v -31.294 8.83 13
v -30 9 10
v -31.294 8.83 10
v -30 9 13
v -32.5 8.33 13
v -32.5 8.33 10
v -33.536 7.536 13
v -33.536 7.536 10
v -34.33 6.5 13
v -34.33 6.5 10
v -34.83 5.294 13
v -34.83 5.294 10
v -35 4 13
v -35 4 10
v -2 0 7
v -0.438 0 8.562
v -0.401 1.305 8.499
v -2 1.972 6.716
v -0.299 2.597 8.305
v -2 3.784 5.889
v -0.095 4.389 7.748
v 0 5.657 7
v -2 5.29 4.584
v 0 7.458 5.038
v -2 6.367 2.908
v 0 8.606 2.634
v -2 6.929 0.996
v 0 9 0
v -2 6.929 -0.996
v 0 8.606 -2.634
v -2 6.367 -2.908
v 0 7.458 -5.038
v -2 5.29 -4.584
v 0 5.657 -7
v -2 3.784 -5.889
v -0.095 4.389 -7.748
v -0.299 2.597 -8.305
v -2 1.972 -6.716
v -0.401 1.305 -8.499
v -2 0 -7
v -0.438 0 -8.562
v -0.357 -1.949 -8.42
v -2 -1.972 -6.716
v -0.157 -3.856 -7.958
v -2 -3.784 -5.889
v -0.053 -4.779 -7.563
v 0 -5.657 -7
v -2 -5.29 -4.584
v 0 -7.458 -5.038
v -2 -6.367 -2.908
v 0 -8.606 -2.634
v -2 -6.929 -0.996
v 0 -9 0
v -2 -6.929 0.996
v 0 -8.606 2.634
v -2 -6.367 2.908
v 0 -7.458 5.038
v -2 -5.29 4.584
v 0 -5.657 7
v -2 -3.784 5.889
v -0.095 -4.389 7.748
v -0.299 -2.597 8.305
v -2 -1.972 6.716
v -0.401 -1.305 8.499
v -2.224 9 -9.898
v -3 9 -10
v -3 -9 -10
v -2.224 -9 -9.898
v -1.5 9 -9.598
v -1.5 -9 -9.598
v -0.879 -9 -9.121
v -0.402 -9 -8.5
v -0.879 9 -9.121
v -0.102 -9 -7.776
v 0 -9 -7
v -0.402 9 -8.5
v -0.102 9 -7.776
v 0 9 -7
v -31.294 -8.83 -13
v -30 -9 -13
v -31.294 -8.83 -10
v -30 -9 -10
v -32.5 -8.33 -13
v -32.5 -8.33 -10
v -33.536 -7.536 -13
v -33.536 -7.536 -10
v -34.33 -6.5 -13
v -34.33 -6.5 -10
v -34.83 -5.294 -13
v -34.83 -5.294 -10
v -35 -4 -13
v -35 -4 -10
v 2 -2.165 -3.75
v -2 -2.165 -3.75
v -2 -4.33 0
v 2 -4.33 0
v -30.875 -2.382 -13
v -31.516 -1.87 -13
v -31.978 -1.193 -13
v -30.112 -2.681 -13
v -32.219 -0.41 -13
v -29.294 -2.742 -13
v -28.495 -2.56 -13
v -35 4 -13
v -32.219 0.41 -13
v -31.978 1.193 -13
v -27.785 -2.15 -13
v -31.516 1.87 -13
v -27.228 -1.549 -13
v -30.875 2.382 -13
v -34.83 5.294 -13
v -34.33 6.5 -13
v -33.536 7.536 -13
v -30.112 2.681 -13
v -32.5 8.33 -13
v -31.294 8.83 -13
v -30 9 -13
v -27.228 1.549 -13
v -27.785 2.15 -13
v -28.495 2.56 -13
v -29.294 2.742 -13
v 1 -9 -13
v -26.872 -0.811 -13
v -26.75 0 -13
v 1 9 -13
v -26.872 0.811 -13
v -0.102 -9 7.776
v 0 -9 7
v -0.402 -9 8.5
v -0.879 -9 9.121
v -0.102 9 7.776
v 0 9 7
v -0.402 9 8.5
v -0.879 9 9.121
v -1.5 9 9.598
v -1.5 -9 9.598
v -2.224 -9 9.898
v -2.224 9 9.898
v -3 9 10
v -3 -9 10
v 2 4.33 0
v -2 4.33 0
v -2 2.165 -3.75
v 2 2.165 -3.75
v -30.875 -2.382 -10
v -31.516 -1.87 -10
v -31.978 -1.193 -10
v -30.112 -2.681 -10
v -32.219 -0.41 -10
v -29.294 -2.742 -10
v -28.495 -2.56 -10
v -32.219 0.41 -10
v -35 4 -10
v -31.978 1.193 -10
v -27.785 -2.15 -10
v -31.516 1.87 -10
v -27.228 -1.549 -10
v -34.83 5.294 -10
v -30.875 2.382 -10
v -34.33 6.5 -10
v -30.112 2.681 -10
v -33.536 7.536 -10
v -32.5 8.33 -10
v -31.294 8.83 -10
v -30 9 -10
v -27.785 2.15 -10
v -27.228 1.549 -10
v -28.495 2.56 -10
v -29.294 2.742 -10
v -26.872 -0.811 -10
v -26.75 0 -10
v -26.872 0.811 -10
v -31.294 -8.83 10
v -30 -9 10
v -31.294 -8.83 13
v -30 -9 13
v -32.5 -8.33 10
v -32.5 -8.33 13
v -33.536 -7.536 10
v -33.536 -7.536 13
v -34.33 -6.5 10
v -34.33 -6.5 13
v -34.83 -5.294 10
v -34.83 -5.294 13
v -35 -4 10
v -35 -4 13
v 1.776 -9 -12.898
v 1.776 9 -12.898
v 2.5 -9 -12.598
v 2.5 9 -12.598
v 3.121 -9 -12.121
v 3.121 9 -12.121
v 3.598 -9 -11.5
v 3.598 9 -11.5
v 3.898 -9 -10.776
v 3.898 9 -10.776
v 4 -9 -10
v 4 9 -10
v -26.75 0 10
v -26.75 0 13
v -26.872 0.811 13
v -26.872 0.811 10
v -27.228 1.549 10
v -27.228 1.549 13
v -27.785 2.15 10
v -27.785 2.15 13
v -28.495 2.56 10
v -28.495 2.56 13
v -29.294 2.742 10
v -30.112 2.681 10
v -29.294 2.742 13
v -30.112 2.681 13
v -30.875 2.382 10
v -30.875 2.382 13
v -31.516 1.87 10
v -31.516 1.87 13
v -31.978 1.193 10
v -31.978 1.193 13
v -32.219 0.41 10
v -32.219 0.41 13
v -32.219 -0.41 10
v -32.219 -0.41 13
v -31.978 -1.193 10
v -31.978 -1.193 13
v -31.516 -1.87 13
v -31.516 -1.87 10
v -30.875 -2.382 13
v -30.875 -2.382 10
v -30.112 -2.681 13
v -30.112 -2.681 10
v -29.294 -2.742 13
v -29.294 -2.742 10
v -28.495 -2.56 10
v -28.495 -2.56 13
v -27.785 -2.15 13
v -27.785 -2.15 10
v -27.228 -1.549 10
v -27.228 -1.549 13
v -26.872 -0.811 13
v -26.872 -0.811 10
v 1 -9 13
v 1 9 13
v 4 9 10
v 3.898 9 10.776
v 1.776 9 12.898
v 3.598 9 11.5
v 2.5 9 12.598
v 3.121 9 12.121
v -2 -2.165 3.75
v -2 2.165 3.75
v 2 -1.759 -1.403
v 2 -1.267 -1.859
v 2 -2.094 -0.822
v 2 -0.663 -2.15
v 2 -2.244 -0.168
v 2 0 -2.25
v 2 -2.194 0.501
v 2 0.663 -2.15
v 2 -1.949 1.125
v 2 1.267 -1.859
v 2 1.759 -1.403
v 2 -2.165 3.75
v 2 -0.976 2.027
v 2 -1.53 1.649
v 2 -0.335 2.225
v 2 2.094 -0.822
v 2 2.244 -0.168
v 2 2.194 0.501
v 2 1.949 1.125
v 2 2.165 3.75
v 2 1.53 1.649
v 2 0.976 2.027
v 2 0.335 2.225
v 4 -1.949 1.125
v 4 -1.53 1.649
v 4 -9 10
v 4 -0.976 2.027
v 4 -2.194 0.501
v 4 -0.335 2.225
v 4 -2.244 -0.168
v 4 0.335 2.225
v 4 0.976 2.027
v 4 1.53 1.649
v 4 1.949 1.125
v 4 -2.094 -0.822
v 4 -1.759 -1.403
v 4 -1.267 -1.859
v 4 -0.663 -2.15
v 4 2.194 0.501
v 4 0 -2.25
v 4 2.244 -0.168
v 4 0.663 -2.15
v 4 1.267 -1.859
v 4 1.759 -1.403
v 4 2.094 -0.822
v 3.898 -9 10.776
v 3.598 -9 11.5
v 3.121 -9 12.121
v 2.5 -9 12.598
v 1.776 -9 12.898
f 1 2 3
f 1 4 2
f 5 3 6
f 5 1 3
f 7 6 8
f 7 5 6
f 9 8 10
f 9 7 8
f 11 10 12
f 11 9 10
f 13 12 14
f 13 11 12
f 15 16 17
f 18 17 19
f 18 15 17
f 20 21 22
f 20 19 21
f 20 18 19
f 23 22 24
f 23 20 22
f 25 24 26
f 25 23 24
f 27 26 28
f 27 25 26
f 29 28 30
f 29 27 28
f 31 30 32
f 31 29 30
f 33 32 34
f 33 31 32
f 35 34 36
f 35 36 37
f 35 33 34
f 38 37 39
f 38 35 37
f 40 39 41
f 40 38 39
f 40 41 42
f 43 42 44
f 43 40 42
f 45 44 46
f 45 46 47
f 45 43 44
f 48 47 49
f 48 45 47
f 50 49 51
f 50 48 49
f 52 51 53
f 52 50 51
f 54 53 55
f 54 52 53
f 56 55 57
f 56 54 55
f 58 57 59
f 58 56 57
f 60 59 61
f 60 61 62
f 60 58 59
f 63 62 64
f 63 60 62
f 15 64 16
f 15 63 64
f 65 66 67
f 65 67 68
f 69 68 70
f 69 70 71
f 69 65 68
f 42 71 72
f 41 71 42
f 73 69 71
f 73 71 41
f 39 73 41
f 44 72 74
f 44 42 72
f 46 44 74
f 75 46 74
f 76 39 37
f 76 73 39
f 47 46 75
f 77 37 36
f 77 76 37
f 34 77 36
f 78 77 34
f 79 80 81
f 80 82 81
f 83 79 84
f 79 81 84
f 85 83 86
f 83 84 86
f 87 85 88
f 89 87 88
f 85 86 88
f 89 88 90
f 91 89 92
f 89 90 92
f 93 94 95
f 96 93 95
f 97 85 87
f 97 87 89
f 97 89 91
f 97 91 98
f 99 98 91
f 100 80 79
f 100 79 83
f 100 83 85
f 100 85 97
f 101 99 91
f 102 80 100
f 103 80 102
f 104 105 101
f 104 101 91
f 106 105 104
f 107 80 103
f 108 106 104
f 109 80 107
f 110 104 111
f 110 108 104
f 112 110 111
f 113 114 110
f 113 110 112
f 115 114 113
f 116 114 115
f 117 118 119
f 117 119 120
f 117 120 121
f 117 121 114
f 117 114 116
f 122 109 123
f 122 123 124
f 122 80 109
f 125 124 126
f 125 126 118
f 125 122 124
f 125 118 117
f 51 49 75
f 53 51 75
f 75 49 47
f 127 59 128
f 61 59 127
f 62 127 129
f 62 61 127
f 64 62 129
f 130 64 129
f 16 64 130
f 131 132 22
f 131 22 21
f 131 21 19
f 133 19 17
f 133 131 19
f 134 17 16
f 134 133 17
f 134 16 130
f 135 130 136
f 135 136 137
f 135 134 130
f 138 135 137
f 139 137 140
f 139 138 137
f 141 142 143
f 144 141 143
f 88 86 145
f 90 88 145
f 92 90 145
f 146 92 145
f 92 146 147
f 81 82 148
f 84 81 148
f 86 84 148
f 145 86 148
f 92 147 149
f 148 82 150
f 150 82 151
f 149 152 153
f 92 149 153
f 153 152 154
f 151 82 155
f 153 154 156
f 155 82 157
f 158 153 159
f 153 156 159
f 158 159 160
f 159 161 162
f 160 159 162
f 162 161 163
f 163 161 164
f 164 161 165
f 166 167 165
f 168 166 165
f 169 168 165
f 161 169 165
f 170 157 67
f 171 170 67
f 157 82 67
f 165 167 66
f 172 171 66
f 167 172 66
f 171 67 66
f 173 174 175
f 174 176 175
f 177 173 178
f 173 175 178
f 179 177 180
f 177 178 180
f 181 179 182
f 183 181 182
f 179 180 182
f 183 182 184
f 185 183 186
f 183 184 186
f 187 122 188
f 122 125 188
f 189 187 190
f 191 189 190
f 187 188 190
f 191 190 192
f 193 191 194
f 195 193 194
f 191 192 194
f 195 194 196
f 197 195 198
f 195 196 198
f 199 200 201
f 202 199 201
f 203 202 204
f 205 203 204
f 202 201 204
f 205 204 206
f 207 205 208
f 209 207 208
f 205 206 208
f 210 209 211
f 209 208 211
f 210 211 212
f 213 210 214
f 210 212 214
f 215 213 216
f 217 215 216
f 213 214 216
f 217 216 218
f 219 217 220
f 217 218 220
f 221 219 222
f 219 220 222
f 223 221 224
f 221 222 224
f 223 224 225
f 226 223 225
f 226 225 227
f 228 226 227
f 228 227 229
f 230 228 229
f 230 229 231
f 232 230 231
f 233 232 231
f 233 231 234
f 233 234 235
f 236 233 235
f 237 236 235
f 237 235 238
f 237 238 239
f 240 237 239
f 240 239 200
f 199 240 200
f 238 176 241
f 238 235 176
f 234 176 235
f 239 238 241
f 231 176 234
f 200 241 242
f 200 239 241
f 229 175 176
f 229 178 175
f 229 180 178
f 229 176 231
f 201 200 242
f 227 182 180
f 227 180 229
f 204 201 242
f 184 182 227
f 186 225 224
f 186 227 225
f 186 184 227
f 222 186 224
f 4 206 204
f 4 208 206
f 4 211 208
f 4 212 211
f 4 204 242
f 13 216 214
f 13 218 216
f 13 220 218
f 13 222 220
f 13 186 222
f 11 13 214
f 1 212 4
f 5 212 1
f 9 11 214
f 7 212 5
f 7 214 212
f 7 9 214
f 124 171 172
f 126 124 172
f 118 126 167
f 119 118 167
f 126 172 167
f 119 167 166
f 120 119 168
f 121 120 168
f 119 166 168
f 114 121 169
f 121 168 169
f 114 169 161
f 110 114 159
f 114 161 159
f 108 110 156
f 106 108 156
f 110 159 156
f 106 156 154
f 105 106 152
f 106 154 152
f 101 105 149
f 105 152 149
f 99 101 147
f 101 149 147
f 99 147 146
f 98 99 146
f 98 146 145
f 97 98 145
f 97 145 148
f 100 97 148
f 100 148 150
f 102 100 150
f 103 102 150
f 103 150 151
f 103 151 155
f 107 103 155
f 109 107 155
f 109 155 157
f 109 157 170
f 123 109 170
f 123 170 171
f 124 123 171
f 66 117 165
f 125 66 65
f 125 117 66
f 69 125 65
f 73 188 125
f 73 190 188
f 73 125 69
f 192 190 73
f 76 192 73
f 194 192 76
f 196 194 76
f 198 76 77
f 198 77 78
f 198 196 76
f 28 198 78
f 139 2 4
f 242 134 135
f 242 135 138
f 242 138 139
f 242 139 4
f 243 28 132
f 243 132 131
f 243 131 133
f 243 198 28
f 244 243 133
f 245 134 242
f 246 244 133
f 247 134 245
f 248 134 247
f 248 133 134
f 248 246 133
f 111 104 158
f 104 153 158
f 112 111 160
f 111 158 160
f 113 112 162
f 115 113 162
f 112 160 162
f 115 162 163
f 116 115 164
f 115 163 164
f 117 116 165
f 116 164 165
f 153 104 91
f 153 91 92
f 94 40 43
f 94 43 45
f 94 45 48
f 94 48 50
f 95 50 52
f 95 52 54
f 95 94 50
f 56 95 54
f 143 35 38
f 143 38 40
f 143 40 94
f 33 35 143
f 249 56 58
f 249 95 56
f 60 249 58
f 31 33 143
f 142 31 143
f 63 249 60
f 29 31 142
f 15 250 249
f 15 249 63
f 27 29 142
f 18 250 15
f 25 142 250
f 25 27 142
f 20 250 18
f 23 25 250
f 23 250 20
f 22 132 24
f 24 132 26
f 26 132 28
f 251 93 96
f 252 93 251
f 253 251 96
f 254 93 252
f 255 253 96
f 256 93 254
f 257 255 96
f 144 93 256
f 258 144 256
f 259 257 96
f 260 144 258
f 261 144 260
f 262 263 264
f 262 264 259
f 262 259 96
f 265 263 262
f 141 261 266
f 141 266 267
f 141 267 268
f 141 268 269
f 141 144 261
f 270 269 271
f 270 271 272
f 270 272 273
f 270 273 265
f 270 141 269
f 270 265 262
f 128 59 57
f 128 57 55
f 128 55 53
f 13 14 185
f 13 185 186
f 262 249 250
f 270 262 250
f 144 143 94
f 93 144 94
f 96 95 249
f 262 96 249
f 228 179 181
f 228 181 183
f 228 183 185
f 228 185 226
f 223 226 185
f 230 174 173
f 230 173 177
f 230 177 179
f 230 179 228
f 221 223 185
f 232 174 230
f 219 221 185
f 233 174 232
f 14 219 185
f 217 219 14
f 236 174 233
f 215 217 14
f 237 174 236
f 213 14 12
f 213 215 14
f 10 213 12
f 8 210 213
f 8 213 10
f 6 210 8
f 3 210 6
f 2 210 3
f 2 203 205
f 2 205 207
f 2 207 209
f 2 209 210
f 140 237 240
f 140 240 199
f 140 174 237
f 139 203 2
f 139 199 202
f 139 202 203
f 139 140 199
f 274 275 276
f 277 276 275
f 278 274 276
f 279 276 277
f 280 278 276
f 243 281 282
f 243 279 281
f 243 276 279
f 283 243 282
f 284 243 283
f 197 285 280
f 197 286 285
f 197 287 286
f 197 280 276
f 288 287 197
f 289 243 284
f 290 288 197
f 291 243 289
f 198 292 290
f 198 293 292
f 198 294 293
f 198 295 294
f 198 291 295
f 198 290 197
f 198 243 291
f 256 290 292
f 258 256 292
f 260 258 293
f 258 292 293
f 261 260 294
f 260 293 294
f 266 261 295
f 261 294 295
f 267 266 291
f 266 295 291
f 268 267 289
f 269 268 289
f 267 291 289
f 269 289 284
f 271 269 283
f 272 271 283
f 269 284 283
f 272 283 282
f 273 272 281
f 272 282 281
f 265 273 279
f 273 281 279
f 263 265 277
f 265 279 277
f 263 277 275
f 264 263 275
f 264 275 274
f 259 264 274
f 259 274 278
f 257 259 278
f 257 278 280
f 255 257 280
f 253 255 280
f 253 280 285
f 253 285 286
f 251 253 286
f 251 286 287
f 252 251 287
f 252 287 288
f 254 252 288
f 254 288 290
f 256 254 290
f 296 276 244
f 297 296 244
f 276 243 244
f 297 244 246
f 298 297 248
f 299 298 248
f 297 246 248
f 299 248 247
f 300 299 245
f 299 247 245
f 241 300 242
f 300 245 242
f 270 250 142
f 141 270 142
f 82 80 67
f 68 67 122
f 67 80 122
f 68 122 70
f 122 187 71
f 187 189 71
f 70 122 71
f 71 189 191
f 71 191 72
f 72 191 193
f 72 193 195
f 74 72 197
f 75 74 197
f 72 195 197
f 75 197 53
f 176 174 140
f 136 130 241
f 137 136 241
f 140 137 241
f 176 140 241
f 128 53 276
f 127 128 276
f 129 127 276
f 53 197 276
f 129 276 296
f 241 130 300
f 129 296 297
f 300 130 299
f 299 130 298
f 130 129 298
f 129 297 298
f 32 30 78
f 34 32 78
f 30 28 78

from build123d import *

# Parameters (mm, degrees)
SKETCH1_W           = 26
SKETCH1_H           = 18
BOSS_EXTRUDE1_DEPTH = 4
SKETCH2_W           = 3
SKETCH2_H           = 18
BOSS_EXTRUDE2_DEPTH = 35
SKETCH3_R           = 2.75
CUT_EXTRUDE1_DEPTH  = 45.519658579
FILLET1_R           = 3
FILLET2_R           = 5
SKETCH5_R           = 7
BOSS_EXTRUDE3_DEPTH = 2
CUT_EXTRUDE3_REACH  = 44.083
SKETCH7_R           = 2.25
CUT_EXTRUDE4_DEPTH  = 4
CHAMFER1_SIZE       = 2


with BuildPart() as part:
    # Sketch1 → Boss-Extrude1 (new body)
    with BuildSketch(Plane(origin=(0, 0, 0), x_dir=(0, 0, -1), z_dir=(1, 0, 0))):
        Rectangle(SKETCH1_W, SKETCH1_H)
    extrude(amount=BOSS_EXTRUDE1_DEPTH)

    # Sketch2 → Boss-Extrude2 (add)
    with BuildSketch(Plane.ZY):
        with Locations((-11.5, 0)):
            Rectangle(SKETCH2_W, SKETCH2_H)
        with Locations((11.5, 0)):
            Rectangle(SKETCH2_W, SKETCH2_H)
    extrude(amount=BOSS_EXTRUDE2_DEPTH)

    # Sketch3 → Cut-Extrude1 (cut, through all)
    with BuildSketch(Plane.XY.offset(13)):
        with Locations((-29.5, 0)):
            Circle(SKETCH3_R)
    extrude(amount=-CUT_EXTRUDE1_DEPTH, mode=Mode.SUBTRACT)

    # Fillet1
    fillet1_edges = [part.edges().sort_by_distance(p)[0] for p in [
        (4, 0, 13),
        (0, 0, -10),
        (0, 0, 10),
        (4, 0, -13),
    ]]
    fillet(fillet1_edges, radius=FILLET1_R)

    # Fillet2
    fillet2_edges = [part.edges().sort_by_distance(p)[0] for p in [
        (-35, -9, -11.5),
        (-35, 9, -11.5),
        (-35, 9, 11.5),
        (-35, -9, 11.5),
    ]]
    fillet(fillet2_edges, radius=FILLET2_R)

    # Sketch5 → Boss-Extrude3 (add)
    with BuildSketch(Plane.ZY):
        Circle(SKETCH5_R)
    extrude(amount=BOSS_EXTRUDE3_DEPTH)

    # Sketch7 → Cut-Extrude3 (cut, up to next)
    with BuildSketch(Plane(origin=(4, 0, 0), x_dir=(0, 0, -1), z_dir=(1, 0, 0)), mode=Mode.PRIVATE) as cut_extrude3_sk1:
        Circle(SKETCH7_R)
    cut_extrude3_tool1 = extrude(cut_extrude3_sk1.sketch, amount=-CUT_EXTRUDE3_REACH, mode=Mode.PRIVATE) & part.part
    add(cut_extrude3_tool1.solids().sort_by_distance((4, 0, 0))[0], mode=Mode.SUBTRACT)

    # Sketch8 → Cut-Extrude4 (cut)
    with BuildSketch(Plane.ZY.offset(2)):
        Polygon((0, 4.330127019), (-3.75, 2.165063509), (-3.75, -2.165063509), (0, -4.330127019), (3.75, -2.165063509), (3.75, 2.165063509), align=None)
    extrude(amount=-CUT_EXTRUDE4_DEPTH, mode=Mode.SUBTRACT)

    # Chamfer1
    # the kernel refuses this chamfer: 2 mm, written as the material it adds along each edge
    with BuildSketch(Plane(origin=(0, 0, 0), x_dir=(0, 0, 1), z_dir=(0, -1, 0))) as chamfer1_piece_1_section:
        Polygon((7 + CHAMFER1_SIZE, 0), (7, CHAMFER1_SIZE), (7, 0), align=None)
    chamfer1_piece_1 = revolve(axis=Axis((0, 0, 0), (-1, 0, 0)), revolution_arc=180.000000041, mode=Mode.PRIVATE)
    chamfer1_piece_1 = split(chamfer1_piece_1, bisect_by=Plane(origin=(-0.945175713, 9, -3e-09), z_dir=(0, -1, 0)), keep=Keep.TOP, mode=Mode.PRIVATE)
    chamfer1_piece_1 = split(chamfer1_piece_1, bisect_by=Plane(origin=(-2, 8.001744255, -3e-09), z_dir=(1, 0, 0)), keep=Keep.TOP, mode=Mode.PRIVATE)
    add(chamfer1_piece_1)
    with BuildSketch(Plane(origin=(0, 0, 0), x_dir=(0, -7.23525117256177e-10, -1.0), z_dir=(0, 1.0, -7.23525117256177e-10))) as chamfer1_piece_2_section:
        Polygon((7 + CHAMFER1_SIZE, 0), (7, CHAMFER1_SIZE), (7, 0), align=None)
    chamfer1_piece_2 = revolve(axis=Axis((0, 0, 0), (-1, 0, 0)), revolution_arc=179.999999959, mode=Mode.PRIVATE)
    chamfer1_piece_2 = split(chamfer1_piece_2, bisect_by=Plane(origin=(-0.945175715, -9, 3e-09), z_dir=(0, 1, 0)), keep=Keep.TOP, mode=Mode.PRIVATE)
    chamfer1_piece_2 = split(chamfer1_piece_2, bisect_by=Plane(origin=(-2, -8.001744258, 3e-09), z_dir=(1, 0, 0)), keep=Keep.TOP, mode=Mode.PRIVATE)
    add(chamfer1_piece_2)


solid = part.part
